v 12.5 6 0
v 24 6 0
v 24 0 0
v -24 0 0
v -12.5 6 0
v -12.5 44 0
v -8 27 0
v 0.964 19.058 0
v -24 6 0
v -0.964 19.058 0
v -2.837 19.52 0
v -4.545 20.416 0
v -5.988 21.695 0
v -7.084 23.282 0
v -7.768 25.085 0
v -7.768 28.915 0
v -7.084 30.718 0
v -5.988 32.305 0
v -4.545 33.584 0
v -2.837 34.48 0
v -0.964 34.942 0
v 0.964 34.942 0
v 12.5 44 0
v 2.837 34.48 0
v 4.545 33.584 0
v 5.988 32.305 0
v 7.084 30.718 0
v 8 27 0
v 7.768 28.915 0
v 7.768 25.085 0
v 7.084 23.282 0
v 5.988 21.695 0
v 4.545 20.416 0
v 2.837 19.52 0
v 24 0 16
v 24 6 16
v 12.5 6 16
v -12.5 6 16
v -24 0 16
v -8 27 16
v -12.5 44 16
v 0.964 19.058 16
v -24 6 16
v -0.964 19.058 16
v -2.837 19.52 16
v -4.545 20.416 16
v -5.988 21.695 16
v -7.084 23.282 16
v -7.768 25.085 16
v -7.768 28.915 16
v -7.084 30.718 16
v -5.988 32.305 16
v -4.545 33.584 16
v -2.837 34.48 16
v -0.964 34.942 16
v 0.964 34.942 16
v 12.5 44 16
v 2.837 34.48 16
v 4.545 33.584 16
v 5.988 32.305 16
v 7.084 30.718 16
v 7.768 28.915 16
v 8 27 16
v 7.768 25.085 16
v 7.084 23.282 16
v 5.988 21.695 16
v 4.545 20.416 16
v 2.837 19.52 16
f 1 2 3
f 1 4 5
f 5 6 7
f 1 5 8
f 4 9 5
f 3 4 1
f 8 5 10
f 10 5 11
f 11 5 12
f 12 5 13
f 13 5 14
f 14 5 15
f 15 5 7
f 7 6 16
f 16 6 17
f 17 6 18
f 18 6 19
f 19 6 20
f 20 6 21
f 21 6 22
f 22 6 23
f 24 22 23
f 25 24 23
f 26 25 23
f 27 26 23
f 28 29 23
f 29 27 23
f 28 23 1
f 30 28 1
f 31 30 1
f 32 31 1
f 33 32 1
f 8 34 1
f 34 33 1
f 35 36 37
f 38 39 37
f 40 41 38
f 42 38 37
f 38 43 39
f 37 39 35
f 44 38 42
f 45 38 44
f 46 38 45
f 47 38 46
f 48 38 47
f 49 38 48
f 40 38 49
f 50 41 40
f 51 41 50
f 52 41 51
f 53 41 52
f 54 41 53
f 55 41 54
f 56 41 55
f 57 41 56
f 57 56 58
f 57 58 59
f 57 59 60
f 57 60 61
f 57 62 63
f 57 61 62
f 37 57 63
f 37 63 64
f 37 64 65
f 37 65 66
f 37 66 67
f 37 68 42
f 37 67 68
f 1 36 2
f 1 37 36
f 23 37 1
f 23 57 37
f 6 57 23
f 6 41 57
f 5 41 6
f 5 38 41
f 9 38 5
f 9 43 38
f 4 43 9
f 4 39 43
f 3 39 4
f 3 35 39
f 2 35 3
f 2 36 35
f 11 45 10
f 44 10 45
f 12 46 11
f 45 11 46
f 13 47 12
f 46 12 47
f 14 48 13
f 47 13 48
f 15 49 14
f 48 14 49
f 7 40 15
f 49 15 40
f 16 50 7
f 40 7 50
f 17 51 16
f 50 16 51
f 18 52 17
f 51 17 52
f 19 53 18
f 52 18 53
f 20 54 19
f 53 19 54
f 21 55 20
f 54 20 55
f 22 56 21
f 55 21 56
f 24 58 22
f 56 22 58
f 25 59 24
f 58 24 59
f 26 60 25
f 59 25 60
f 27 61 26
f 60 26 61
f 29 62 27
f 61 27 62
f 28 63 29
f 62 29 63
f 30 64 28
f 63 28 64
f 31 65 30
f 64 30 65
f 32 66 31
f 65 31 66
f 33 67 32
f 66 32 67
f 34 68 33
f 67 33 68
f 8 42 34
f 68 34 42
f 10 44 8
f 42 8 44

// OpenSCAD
//vxb rail support block
//http://www.vxb.com/page/bearings/PROD/kit7136

include <MCAD/materials.scad>

module support_block(){
    D=16;
    h=27;
    E=24;
    W=48;
    L=16;
    F=44;
    G=6;
    P=25;
    B=38;
    S=5.5;
    locking_bolt=4; //M4
    clamping_bolt=5; //M5

    color(Aluminum) linear_extrude(height=L){
        difference(){
            union(){
                translate([-W/2,0]) square([W,G]);
                translate([-P/2,0]) square([P,F]);
            }
                translate([0,h]) circle(r=D/2);
        }
    }
}
support_block();
